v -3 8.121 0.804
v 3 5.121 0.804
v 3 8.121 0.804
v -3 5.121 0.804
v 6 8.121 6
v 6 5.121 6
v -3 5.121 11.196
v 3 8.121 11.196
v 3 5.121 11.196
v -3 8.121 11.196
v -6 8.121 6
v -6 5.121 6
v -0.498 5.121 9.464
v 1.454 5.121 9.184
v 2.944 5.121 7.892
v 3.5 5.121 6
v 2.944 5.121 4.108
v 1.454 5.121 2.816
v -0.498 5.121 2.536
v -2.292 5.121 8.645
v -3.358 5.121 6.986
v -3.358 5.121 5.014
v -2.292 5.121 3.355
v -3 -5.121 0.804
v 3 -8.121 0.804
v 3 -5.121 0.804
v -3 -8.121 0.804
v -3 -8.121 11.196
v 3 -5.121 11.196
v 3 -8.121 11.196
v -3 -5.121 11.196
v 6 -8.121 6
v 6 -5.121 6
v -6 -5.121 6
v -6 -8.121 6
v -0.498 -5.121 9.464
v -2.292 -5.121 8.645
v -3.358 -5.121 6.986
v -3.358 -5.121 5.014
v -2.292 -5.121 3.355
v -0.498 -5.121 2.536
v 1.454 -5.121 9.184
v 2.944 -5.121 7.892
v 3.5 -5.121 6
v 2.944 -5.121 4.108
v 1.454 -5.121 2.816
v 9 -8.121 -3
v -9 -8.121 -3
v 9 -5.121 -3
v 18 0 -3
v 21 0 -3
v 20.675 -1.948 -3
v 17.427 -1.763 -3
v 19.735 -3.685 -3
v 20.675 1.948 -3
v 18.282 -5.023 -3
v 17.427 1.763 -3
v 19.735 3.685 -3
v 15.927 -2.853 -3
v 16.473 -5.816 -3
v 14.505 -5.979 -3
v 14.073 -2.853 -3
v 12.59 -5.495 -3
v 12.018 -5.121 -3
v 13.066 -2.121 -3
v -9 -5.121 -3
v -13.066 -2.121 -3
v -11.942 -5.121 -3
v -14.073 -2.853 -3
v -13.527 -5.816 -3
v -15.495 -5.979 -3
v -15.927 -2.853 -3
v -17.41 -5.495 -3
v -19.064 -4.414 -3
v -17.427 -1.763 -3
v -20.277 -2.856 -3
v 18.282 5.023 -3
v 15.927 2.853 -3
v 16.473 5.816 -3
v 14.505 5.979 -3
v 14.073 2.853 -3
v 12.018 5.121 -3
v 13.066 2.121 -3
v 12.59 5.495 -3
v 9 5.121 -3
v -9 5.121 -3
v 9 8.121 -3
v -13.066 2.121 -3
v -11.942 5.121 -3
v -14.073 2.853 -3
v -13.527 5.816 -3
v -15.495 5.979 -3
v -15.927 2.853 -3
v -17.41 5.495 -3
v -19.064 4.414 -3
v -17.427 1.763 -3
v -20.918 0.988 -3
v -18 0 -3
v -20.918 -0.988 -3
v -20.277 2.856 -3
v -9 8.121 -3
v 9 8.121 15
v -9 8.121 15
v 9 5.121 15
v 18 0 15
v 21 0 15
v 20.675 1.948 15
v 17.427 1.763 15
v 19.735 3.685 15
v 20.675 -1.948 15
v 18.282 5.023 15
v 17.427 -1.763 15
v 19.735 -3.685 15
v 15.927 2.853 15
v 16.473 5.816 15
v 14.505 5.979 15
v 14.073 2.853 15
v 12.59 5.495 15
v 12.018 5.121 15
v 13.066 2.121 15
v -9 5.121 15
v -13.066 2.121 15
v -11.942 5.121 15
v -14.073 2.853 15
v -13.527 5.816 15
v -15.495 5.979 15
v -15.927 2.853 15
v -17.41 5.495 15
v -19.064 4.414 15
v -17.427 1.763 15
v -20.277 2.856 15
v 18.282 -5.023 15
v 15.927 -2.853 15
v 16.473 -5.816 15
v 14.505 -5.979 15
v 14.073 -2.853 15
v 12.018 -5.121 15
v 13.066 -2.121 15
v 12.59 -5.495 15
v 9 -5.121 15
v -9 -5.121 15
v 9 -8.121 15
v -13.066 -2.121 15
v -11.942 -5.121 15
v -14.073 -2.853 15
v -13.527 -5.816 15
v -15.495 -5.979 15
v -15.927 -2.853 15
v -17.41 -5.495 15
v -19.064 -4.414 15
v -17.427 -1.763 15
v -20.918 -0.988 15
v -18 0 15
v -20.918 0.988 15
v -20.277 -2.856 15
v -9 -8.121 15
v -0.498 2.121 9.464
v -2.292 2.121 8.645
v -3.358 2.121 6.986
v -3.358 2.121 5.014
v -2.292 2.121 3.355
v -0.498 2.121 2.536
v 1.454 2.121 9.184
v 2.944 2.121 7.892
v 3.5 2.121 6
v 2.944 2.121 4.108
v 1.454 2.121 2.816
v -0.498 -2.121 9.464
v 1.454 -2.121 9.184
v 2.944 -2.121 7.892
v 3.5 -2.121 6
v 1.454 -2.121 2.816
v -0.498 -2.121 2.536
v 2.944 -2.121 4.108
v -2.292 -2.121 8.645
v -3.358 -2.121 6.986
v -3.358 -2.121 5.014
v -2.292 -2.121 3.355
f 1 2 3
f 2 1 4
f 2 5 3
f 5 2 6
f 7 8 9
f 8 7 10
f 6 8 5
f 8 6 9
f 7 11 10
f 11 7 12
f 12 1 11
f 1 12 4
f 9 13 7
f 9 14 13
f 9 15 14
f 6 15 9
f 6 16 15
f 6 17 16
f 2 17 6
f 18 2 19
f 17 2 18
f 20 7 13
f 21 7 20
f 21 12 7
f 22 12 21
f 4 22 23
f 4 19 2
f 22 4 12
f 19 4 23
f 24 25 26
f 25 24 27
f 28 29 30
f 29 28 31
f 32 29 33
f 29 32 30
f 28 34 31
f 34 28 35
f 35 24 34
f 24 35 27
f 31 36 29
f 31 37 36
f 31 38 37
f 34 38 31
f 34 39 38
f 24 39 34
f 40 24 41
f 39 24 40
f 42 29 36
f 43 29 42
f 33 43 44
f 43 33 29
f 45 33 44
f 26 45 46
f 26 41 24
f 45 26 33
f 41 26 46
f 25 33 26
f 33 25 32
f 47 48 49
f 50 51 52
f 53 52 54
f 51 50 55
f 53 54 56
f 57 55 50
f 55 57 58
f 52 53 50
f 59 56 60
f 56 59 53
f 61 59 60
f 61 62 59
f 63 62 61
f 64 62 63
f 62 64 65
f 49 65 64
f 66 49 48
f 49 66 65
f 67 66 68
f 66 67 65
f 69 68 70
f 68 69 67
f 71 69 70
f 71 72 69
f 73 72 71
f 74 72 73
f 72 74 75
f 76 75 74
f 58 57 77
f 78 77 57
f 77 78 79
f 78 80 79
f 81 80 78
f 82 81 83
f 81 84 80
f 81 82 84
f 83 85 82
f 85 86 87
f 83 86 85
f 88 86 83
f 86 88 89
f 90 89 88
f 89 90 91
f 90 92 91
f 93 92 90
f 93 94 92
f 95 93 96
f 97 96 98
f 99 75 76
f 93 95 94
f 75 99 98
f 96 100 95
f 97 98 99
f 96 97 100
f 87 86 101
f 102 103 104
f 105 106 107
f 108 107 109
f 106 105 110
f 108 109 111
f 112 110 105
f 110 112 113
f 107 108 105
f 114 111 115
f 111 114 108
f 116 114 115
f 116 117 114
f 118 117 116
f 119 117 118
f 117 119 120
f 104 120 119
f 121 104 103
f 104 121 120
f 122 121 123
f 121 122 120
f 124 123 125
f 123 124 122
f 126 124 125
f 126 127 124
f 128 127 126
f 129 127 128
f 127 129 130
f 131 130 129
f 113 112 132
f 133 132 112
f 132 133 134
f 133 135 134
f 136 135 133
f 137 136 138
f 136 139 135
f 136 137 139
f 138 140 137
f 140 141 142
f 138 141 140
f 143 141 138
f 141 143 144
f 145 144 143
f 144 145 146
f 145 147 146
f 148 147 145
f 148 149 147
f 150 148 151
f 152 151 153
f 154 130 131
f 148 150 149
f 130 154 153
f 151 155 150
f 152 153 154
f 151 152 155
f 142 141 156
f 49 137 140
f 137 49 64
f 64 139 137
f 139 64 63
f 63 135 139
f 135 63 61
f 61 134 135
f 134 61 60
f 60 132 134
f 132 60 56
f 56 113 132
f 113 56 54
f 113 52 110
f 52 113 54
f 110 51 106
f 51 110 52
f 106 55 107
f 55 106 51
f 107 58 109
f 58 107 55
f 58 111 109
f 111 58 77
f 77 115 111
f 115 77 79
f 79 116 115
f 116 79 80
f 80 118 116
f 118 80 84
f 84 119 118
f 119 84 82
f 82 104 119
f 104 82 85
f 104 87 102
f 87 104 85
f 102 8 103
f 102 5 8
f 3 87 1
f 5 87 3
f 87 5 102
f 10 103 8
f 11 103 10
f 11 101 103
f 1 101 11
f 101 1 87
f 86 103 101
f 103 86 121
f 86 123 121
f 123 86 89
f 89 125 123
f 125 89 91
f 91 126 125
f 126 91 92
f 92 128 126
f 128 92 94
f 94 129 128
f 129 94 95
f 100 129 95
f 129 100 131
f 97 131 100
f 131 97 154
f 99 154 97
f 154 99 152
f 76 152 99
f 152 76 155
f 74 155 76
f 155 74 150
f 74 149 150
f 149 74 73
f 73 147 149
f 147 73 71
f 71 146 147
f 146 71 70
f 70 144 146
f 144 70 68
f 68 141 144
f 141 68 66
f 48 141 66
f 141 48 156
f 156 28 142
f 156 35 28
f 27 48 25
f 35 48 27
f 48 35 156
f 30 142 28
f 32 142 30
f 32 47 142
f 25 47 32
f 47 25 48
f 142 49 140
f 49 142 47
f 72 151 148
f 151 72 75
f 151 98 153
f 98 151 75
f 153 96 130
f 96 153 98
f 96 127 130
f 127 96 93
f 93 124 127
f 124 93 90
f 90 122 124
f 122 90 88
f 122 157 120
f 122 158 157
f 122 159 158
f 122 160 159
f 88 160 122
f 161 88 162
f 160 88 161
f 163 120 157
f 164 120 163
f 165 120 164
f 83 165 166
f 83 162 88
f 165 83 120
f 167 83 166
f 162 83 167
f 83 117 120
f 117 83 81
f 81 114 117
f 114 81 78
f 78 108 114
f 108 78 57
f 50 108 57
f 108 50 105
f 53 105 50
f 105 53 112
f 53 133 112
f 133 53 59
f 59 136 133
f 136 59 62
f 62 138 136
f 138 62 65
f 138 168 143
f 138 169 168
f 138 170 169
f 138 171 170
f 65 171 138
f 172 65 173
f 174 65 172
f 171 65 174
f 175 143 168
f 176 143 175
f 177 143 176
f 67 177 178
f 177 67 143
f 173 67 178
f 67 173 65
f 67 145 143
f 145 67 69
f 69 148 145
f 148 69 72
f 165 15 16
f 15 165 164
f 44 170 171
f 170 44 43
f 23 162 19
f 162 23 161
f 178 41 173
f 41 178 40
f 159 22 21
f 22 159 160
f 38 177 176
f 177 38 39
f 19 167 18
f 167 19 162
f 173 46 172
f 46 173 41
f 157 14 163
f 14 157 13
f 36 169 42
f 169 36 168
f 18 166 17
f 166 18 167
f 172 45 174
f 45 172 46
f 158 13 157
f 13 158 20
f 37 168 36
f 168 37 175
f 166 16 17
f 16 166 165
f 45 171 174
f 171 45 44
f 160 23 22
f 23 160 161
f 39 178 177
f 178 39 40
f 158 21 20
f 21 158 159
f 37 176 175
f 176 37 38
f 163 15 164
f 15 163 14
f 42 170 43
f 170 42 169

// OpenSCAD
rodsize = 6;
rodspacing = 30;
partthick = rodsize * 2;
nutsize = rodsize * 2;

module z_leadscrew_nut_clamp() difference() {
	union() {
		linear_extrude(height = partthick / 2 + nutsize, center = true, convexity = 5) difference() {
			union() {
				for(side = [1, -1]) translate([side * rodspacing / 2, 0, 0]) circle(r = partthick / 2, center = true);
				square([rodspacing, partthick / 2 + rodsize * sin(45)], center = true); 
				square([partthick / 2 + nutsize, partthick / 2 + rodsize * sin(45) + rodsize], center = true); 
			}
			for(side = [1, -1]) translate([side * rodspacing / 2, 0, 0]) circle(r = rodsize / 2, center = true);
			square([rodspacing, rodsize * sin(45)], center = true); 
		}
	}
	rotate([90, 0, 0]) cylinder(r = rodsize / 2 + 0.5, h = partthick / 2 + rodsize * sin(45) + rodsize + 1, center = true);
	for(side = [1, -1]) translate([0, side * (rodsize * sin(45) / 2 + partthick / 2), 0]) rotate([90, 0, 0]) cylinder(r = partthick / 2, h = partthick / 2, center = true, $fn = 6);
}

translate([0, 0, partthick / 2]) z_leadscrew_nut_clamp(); 
